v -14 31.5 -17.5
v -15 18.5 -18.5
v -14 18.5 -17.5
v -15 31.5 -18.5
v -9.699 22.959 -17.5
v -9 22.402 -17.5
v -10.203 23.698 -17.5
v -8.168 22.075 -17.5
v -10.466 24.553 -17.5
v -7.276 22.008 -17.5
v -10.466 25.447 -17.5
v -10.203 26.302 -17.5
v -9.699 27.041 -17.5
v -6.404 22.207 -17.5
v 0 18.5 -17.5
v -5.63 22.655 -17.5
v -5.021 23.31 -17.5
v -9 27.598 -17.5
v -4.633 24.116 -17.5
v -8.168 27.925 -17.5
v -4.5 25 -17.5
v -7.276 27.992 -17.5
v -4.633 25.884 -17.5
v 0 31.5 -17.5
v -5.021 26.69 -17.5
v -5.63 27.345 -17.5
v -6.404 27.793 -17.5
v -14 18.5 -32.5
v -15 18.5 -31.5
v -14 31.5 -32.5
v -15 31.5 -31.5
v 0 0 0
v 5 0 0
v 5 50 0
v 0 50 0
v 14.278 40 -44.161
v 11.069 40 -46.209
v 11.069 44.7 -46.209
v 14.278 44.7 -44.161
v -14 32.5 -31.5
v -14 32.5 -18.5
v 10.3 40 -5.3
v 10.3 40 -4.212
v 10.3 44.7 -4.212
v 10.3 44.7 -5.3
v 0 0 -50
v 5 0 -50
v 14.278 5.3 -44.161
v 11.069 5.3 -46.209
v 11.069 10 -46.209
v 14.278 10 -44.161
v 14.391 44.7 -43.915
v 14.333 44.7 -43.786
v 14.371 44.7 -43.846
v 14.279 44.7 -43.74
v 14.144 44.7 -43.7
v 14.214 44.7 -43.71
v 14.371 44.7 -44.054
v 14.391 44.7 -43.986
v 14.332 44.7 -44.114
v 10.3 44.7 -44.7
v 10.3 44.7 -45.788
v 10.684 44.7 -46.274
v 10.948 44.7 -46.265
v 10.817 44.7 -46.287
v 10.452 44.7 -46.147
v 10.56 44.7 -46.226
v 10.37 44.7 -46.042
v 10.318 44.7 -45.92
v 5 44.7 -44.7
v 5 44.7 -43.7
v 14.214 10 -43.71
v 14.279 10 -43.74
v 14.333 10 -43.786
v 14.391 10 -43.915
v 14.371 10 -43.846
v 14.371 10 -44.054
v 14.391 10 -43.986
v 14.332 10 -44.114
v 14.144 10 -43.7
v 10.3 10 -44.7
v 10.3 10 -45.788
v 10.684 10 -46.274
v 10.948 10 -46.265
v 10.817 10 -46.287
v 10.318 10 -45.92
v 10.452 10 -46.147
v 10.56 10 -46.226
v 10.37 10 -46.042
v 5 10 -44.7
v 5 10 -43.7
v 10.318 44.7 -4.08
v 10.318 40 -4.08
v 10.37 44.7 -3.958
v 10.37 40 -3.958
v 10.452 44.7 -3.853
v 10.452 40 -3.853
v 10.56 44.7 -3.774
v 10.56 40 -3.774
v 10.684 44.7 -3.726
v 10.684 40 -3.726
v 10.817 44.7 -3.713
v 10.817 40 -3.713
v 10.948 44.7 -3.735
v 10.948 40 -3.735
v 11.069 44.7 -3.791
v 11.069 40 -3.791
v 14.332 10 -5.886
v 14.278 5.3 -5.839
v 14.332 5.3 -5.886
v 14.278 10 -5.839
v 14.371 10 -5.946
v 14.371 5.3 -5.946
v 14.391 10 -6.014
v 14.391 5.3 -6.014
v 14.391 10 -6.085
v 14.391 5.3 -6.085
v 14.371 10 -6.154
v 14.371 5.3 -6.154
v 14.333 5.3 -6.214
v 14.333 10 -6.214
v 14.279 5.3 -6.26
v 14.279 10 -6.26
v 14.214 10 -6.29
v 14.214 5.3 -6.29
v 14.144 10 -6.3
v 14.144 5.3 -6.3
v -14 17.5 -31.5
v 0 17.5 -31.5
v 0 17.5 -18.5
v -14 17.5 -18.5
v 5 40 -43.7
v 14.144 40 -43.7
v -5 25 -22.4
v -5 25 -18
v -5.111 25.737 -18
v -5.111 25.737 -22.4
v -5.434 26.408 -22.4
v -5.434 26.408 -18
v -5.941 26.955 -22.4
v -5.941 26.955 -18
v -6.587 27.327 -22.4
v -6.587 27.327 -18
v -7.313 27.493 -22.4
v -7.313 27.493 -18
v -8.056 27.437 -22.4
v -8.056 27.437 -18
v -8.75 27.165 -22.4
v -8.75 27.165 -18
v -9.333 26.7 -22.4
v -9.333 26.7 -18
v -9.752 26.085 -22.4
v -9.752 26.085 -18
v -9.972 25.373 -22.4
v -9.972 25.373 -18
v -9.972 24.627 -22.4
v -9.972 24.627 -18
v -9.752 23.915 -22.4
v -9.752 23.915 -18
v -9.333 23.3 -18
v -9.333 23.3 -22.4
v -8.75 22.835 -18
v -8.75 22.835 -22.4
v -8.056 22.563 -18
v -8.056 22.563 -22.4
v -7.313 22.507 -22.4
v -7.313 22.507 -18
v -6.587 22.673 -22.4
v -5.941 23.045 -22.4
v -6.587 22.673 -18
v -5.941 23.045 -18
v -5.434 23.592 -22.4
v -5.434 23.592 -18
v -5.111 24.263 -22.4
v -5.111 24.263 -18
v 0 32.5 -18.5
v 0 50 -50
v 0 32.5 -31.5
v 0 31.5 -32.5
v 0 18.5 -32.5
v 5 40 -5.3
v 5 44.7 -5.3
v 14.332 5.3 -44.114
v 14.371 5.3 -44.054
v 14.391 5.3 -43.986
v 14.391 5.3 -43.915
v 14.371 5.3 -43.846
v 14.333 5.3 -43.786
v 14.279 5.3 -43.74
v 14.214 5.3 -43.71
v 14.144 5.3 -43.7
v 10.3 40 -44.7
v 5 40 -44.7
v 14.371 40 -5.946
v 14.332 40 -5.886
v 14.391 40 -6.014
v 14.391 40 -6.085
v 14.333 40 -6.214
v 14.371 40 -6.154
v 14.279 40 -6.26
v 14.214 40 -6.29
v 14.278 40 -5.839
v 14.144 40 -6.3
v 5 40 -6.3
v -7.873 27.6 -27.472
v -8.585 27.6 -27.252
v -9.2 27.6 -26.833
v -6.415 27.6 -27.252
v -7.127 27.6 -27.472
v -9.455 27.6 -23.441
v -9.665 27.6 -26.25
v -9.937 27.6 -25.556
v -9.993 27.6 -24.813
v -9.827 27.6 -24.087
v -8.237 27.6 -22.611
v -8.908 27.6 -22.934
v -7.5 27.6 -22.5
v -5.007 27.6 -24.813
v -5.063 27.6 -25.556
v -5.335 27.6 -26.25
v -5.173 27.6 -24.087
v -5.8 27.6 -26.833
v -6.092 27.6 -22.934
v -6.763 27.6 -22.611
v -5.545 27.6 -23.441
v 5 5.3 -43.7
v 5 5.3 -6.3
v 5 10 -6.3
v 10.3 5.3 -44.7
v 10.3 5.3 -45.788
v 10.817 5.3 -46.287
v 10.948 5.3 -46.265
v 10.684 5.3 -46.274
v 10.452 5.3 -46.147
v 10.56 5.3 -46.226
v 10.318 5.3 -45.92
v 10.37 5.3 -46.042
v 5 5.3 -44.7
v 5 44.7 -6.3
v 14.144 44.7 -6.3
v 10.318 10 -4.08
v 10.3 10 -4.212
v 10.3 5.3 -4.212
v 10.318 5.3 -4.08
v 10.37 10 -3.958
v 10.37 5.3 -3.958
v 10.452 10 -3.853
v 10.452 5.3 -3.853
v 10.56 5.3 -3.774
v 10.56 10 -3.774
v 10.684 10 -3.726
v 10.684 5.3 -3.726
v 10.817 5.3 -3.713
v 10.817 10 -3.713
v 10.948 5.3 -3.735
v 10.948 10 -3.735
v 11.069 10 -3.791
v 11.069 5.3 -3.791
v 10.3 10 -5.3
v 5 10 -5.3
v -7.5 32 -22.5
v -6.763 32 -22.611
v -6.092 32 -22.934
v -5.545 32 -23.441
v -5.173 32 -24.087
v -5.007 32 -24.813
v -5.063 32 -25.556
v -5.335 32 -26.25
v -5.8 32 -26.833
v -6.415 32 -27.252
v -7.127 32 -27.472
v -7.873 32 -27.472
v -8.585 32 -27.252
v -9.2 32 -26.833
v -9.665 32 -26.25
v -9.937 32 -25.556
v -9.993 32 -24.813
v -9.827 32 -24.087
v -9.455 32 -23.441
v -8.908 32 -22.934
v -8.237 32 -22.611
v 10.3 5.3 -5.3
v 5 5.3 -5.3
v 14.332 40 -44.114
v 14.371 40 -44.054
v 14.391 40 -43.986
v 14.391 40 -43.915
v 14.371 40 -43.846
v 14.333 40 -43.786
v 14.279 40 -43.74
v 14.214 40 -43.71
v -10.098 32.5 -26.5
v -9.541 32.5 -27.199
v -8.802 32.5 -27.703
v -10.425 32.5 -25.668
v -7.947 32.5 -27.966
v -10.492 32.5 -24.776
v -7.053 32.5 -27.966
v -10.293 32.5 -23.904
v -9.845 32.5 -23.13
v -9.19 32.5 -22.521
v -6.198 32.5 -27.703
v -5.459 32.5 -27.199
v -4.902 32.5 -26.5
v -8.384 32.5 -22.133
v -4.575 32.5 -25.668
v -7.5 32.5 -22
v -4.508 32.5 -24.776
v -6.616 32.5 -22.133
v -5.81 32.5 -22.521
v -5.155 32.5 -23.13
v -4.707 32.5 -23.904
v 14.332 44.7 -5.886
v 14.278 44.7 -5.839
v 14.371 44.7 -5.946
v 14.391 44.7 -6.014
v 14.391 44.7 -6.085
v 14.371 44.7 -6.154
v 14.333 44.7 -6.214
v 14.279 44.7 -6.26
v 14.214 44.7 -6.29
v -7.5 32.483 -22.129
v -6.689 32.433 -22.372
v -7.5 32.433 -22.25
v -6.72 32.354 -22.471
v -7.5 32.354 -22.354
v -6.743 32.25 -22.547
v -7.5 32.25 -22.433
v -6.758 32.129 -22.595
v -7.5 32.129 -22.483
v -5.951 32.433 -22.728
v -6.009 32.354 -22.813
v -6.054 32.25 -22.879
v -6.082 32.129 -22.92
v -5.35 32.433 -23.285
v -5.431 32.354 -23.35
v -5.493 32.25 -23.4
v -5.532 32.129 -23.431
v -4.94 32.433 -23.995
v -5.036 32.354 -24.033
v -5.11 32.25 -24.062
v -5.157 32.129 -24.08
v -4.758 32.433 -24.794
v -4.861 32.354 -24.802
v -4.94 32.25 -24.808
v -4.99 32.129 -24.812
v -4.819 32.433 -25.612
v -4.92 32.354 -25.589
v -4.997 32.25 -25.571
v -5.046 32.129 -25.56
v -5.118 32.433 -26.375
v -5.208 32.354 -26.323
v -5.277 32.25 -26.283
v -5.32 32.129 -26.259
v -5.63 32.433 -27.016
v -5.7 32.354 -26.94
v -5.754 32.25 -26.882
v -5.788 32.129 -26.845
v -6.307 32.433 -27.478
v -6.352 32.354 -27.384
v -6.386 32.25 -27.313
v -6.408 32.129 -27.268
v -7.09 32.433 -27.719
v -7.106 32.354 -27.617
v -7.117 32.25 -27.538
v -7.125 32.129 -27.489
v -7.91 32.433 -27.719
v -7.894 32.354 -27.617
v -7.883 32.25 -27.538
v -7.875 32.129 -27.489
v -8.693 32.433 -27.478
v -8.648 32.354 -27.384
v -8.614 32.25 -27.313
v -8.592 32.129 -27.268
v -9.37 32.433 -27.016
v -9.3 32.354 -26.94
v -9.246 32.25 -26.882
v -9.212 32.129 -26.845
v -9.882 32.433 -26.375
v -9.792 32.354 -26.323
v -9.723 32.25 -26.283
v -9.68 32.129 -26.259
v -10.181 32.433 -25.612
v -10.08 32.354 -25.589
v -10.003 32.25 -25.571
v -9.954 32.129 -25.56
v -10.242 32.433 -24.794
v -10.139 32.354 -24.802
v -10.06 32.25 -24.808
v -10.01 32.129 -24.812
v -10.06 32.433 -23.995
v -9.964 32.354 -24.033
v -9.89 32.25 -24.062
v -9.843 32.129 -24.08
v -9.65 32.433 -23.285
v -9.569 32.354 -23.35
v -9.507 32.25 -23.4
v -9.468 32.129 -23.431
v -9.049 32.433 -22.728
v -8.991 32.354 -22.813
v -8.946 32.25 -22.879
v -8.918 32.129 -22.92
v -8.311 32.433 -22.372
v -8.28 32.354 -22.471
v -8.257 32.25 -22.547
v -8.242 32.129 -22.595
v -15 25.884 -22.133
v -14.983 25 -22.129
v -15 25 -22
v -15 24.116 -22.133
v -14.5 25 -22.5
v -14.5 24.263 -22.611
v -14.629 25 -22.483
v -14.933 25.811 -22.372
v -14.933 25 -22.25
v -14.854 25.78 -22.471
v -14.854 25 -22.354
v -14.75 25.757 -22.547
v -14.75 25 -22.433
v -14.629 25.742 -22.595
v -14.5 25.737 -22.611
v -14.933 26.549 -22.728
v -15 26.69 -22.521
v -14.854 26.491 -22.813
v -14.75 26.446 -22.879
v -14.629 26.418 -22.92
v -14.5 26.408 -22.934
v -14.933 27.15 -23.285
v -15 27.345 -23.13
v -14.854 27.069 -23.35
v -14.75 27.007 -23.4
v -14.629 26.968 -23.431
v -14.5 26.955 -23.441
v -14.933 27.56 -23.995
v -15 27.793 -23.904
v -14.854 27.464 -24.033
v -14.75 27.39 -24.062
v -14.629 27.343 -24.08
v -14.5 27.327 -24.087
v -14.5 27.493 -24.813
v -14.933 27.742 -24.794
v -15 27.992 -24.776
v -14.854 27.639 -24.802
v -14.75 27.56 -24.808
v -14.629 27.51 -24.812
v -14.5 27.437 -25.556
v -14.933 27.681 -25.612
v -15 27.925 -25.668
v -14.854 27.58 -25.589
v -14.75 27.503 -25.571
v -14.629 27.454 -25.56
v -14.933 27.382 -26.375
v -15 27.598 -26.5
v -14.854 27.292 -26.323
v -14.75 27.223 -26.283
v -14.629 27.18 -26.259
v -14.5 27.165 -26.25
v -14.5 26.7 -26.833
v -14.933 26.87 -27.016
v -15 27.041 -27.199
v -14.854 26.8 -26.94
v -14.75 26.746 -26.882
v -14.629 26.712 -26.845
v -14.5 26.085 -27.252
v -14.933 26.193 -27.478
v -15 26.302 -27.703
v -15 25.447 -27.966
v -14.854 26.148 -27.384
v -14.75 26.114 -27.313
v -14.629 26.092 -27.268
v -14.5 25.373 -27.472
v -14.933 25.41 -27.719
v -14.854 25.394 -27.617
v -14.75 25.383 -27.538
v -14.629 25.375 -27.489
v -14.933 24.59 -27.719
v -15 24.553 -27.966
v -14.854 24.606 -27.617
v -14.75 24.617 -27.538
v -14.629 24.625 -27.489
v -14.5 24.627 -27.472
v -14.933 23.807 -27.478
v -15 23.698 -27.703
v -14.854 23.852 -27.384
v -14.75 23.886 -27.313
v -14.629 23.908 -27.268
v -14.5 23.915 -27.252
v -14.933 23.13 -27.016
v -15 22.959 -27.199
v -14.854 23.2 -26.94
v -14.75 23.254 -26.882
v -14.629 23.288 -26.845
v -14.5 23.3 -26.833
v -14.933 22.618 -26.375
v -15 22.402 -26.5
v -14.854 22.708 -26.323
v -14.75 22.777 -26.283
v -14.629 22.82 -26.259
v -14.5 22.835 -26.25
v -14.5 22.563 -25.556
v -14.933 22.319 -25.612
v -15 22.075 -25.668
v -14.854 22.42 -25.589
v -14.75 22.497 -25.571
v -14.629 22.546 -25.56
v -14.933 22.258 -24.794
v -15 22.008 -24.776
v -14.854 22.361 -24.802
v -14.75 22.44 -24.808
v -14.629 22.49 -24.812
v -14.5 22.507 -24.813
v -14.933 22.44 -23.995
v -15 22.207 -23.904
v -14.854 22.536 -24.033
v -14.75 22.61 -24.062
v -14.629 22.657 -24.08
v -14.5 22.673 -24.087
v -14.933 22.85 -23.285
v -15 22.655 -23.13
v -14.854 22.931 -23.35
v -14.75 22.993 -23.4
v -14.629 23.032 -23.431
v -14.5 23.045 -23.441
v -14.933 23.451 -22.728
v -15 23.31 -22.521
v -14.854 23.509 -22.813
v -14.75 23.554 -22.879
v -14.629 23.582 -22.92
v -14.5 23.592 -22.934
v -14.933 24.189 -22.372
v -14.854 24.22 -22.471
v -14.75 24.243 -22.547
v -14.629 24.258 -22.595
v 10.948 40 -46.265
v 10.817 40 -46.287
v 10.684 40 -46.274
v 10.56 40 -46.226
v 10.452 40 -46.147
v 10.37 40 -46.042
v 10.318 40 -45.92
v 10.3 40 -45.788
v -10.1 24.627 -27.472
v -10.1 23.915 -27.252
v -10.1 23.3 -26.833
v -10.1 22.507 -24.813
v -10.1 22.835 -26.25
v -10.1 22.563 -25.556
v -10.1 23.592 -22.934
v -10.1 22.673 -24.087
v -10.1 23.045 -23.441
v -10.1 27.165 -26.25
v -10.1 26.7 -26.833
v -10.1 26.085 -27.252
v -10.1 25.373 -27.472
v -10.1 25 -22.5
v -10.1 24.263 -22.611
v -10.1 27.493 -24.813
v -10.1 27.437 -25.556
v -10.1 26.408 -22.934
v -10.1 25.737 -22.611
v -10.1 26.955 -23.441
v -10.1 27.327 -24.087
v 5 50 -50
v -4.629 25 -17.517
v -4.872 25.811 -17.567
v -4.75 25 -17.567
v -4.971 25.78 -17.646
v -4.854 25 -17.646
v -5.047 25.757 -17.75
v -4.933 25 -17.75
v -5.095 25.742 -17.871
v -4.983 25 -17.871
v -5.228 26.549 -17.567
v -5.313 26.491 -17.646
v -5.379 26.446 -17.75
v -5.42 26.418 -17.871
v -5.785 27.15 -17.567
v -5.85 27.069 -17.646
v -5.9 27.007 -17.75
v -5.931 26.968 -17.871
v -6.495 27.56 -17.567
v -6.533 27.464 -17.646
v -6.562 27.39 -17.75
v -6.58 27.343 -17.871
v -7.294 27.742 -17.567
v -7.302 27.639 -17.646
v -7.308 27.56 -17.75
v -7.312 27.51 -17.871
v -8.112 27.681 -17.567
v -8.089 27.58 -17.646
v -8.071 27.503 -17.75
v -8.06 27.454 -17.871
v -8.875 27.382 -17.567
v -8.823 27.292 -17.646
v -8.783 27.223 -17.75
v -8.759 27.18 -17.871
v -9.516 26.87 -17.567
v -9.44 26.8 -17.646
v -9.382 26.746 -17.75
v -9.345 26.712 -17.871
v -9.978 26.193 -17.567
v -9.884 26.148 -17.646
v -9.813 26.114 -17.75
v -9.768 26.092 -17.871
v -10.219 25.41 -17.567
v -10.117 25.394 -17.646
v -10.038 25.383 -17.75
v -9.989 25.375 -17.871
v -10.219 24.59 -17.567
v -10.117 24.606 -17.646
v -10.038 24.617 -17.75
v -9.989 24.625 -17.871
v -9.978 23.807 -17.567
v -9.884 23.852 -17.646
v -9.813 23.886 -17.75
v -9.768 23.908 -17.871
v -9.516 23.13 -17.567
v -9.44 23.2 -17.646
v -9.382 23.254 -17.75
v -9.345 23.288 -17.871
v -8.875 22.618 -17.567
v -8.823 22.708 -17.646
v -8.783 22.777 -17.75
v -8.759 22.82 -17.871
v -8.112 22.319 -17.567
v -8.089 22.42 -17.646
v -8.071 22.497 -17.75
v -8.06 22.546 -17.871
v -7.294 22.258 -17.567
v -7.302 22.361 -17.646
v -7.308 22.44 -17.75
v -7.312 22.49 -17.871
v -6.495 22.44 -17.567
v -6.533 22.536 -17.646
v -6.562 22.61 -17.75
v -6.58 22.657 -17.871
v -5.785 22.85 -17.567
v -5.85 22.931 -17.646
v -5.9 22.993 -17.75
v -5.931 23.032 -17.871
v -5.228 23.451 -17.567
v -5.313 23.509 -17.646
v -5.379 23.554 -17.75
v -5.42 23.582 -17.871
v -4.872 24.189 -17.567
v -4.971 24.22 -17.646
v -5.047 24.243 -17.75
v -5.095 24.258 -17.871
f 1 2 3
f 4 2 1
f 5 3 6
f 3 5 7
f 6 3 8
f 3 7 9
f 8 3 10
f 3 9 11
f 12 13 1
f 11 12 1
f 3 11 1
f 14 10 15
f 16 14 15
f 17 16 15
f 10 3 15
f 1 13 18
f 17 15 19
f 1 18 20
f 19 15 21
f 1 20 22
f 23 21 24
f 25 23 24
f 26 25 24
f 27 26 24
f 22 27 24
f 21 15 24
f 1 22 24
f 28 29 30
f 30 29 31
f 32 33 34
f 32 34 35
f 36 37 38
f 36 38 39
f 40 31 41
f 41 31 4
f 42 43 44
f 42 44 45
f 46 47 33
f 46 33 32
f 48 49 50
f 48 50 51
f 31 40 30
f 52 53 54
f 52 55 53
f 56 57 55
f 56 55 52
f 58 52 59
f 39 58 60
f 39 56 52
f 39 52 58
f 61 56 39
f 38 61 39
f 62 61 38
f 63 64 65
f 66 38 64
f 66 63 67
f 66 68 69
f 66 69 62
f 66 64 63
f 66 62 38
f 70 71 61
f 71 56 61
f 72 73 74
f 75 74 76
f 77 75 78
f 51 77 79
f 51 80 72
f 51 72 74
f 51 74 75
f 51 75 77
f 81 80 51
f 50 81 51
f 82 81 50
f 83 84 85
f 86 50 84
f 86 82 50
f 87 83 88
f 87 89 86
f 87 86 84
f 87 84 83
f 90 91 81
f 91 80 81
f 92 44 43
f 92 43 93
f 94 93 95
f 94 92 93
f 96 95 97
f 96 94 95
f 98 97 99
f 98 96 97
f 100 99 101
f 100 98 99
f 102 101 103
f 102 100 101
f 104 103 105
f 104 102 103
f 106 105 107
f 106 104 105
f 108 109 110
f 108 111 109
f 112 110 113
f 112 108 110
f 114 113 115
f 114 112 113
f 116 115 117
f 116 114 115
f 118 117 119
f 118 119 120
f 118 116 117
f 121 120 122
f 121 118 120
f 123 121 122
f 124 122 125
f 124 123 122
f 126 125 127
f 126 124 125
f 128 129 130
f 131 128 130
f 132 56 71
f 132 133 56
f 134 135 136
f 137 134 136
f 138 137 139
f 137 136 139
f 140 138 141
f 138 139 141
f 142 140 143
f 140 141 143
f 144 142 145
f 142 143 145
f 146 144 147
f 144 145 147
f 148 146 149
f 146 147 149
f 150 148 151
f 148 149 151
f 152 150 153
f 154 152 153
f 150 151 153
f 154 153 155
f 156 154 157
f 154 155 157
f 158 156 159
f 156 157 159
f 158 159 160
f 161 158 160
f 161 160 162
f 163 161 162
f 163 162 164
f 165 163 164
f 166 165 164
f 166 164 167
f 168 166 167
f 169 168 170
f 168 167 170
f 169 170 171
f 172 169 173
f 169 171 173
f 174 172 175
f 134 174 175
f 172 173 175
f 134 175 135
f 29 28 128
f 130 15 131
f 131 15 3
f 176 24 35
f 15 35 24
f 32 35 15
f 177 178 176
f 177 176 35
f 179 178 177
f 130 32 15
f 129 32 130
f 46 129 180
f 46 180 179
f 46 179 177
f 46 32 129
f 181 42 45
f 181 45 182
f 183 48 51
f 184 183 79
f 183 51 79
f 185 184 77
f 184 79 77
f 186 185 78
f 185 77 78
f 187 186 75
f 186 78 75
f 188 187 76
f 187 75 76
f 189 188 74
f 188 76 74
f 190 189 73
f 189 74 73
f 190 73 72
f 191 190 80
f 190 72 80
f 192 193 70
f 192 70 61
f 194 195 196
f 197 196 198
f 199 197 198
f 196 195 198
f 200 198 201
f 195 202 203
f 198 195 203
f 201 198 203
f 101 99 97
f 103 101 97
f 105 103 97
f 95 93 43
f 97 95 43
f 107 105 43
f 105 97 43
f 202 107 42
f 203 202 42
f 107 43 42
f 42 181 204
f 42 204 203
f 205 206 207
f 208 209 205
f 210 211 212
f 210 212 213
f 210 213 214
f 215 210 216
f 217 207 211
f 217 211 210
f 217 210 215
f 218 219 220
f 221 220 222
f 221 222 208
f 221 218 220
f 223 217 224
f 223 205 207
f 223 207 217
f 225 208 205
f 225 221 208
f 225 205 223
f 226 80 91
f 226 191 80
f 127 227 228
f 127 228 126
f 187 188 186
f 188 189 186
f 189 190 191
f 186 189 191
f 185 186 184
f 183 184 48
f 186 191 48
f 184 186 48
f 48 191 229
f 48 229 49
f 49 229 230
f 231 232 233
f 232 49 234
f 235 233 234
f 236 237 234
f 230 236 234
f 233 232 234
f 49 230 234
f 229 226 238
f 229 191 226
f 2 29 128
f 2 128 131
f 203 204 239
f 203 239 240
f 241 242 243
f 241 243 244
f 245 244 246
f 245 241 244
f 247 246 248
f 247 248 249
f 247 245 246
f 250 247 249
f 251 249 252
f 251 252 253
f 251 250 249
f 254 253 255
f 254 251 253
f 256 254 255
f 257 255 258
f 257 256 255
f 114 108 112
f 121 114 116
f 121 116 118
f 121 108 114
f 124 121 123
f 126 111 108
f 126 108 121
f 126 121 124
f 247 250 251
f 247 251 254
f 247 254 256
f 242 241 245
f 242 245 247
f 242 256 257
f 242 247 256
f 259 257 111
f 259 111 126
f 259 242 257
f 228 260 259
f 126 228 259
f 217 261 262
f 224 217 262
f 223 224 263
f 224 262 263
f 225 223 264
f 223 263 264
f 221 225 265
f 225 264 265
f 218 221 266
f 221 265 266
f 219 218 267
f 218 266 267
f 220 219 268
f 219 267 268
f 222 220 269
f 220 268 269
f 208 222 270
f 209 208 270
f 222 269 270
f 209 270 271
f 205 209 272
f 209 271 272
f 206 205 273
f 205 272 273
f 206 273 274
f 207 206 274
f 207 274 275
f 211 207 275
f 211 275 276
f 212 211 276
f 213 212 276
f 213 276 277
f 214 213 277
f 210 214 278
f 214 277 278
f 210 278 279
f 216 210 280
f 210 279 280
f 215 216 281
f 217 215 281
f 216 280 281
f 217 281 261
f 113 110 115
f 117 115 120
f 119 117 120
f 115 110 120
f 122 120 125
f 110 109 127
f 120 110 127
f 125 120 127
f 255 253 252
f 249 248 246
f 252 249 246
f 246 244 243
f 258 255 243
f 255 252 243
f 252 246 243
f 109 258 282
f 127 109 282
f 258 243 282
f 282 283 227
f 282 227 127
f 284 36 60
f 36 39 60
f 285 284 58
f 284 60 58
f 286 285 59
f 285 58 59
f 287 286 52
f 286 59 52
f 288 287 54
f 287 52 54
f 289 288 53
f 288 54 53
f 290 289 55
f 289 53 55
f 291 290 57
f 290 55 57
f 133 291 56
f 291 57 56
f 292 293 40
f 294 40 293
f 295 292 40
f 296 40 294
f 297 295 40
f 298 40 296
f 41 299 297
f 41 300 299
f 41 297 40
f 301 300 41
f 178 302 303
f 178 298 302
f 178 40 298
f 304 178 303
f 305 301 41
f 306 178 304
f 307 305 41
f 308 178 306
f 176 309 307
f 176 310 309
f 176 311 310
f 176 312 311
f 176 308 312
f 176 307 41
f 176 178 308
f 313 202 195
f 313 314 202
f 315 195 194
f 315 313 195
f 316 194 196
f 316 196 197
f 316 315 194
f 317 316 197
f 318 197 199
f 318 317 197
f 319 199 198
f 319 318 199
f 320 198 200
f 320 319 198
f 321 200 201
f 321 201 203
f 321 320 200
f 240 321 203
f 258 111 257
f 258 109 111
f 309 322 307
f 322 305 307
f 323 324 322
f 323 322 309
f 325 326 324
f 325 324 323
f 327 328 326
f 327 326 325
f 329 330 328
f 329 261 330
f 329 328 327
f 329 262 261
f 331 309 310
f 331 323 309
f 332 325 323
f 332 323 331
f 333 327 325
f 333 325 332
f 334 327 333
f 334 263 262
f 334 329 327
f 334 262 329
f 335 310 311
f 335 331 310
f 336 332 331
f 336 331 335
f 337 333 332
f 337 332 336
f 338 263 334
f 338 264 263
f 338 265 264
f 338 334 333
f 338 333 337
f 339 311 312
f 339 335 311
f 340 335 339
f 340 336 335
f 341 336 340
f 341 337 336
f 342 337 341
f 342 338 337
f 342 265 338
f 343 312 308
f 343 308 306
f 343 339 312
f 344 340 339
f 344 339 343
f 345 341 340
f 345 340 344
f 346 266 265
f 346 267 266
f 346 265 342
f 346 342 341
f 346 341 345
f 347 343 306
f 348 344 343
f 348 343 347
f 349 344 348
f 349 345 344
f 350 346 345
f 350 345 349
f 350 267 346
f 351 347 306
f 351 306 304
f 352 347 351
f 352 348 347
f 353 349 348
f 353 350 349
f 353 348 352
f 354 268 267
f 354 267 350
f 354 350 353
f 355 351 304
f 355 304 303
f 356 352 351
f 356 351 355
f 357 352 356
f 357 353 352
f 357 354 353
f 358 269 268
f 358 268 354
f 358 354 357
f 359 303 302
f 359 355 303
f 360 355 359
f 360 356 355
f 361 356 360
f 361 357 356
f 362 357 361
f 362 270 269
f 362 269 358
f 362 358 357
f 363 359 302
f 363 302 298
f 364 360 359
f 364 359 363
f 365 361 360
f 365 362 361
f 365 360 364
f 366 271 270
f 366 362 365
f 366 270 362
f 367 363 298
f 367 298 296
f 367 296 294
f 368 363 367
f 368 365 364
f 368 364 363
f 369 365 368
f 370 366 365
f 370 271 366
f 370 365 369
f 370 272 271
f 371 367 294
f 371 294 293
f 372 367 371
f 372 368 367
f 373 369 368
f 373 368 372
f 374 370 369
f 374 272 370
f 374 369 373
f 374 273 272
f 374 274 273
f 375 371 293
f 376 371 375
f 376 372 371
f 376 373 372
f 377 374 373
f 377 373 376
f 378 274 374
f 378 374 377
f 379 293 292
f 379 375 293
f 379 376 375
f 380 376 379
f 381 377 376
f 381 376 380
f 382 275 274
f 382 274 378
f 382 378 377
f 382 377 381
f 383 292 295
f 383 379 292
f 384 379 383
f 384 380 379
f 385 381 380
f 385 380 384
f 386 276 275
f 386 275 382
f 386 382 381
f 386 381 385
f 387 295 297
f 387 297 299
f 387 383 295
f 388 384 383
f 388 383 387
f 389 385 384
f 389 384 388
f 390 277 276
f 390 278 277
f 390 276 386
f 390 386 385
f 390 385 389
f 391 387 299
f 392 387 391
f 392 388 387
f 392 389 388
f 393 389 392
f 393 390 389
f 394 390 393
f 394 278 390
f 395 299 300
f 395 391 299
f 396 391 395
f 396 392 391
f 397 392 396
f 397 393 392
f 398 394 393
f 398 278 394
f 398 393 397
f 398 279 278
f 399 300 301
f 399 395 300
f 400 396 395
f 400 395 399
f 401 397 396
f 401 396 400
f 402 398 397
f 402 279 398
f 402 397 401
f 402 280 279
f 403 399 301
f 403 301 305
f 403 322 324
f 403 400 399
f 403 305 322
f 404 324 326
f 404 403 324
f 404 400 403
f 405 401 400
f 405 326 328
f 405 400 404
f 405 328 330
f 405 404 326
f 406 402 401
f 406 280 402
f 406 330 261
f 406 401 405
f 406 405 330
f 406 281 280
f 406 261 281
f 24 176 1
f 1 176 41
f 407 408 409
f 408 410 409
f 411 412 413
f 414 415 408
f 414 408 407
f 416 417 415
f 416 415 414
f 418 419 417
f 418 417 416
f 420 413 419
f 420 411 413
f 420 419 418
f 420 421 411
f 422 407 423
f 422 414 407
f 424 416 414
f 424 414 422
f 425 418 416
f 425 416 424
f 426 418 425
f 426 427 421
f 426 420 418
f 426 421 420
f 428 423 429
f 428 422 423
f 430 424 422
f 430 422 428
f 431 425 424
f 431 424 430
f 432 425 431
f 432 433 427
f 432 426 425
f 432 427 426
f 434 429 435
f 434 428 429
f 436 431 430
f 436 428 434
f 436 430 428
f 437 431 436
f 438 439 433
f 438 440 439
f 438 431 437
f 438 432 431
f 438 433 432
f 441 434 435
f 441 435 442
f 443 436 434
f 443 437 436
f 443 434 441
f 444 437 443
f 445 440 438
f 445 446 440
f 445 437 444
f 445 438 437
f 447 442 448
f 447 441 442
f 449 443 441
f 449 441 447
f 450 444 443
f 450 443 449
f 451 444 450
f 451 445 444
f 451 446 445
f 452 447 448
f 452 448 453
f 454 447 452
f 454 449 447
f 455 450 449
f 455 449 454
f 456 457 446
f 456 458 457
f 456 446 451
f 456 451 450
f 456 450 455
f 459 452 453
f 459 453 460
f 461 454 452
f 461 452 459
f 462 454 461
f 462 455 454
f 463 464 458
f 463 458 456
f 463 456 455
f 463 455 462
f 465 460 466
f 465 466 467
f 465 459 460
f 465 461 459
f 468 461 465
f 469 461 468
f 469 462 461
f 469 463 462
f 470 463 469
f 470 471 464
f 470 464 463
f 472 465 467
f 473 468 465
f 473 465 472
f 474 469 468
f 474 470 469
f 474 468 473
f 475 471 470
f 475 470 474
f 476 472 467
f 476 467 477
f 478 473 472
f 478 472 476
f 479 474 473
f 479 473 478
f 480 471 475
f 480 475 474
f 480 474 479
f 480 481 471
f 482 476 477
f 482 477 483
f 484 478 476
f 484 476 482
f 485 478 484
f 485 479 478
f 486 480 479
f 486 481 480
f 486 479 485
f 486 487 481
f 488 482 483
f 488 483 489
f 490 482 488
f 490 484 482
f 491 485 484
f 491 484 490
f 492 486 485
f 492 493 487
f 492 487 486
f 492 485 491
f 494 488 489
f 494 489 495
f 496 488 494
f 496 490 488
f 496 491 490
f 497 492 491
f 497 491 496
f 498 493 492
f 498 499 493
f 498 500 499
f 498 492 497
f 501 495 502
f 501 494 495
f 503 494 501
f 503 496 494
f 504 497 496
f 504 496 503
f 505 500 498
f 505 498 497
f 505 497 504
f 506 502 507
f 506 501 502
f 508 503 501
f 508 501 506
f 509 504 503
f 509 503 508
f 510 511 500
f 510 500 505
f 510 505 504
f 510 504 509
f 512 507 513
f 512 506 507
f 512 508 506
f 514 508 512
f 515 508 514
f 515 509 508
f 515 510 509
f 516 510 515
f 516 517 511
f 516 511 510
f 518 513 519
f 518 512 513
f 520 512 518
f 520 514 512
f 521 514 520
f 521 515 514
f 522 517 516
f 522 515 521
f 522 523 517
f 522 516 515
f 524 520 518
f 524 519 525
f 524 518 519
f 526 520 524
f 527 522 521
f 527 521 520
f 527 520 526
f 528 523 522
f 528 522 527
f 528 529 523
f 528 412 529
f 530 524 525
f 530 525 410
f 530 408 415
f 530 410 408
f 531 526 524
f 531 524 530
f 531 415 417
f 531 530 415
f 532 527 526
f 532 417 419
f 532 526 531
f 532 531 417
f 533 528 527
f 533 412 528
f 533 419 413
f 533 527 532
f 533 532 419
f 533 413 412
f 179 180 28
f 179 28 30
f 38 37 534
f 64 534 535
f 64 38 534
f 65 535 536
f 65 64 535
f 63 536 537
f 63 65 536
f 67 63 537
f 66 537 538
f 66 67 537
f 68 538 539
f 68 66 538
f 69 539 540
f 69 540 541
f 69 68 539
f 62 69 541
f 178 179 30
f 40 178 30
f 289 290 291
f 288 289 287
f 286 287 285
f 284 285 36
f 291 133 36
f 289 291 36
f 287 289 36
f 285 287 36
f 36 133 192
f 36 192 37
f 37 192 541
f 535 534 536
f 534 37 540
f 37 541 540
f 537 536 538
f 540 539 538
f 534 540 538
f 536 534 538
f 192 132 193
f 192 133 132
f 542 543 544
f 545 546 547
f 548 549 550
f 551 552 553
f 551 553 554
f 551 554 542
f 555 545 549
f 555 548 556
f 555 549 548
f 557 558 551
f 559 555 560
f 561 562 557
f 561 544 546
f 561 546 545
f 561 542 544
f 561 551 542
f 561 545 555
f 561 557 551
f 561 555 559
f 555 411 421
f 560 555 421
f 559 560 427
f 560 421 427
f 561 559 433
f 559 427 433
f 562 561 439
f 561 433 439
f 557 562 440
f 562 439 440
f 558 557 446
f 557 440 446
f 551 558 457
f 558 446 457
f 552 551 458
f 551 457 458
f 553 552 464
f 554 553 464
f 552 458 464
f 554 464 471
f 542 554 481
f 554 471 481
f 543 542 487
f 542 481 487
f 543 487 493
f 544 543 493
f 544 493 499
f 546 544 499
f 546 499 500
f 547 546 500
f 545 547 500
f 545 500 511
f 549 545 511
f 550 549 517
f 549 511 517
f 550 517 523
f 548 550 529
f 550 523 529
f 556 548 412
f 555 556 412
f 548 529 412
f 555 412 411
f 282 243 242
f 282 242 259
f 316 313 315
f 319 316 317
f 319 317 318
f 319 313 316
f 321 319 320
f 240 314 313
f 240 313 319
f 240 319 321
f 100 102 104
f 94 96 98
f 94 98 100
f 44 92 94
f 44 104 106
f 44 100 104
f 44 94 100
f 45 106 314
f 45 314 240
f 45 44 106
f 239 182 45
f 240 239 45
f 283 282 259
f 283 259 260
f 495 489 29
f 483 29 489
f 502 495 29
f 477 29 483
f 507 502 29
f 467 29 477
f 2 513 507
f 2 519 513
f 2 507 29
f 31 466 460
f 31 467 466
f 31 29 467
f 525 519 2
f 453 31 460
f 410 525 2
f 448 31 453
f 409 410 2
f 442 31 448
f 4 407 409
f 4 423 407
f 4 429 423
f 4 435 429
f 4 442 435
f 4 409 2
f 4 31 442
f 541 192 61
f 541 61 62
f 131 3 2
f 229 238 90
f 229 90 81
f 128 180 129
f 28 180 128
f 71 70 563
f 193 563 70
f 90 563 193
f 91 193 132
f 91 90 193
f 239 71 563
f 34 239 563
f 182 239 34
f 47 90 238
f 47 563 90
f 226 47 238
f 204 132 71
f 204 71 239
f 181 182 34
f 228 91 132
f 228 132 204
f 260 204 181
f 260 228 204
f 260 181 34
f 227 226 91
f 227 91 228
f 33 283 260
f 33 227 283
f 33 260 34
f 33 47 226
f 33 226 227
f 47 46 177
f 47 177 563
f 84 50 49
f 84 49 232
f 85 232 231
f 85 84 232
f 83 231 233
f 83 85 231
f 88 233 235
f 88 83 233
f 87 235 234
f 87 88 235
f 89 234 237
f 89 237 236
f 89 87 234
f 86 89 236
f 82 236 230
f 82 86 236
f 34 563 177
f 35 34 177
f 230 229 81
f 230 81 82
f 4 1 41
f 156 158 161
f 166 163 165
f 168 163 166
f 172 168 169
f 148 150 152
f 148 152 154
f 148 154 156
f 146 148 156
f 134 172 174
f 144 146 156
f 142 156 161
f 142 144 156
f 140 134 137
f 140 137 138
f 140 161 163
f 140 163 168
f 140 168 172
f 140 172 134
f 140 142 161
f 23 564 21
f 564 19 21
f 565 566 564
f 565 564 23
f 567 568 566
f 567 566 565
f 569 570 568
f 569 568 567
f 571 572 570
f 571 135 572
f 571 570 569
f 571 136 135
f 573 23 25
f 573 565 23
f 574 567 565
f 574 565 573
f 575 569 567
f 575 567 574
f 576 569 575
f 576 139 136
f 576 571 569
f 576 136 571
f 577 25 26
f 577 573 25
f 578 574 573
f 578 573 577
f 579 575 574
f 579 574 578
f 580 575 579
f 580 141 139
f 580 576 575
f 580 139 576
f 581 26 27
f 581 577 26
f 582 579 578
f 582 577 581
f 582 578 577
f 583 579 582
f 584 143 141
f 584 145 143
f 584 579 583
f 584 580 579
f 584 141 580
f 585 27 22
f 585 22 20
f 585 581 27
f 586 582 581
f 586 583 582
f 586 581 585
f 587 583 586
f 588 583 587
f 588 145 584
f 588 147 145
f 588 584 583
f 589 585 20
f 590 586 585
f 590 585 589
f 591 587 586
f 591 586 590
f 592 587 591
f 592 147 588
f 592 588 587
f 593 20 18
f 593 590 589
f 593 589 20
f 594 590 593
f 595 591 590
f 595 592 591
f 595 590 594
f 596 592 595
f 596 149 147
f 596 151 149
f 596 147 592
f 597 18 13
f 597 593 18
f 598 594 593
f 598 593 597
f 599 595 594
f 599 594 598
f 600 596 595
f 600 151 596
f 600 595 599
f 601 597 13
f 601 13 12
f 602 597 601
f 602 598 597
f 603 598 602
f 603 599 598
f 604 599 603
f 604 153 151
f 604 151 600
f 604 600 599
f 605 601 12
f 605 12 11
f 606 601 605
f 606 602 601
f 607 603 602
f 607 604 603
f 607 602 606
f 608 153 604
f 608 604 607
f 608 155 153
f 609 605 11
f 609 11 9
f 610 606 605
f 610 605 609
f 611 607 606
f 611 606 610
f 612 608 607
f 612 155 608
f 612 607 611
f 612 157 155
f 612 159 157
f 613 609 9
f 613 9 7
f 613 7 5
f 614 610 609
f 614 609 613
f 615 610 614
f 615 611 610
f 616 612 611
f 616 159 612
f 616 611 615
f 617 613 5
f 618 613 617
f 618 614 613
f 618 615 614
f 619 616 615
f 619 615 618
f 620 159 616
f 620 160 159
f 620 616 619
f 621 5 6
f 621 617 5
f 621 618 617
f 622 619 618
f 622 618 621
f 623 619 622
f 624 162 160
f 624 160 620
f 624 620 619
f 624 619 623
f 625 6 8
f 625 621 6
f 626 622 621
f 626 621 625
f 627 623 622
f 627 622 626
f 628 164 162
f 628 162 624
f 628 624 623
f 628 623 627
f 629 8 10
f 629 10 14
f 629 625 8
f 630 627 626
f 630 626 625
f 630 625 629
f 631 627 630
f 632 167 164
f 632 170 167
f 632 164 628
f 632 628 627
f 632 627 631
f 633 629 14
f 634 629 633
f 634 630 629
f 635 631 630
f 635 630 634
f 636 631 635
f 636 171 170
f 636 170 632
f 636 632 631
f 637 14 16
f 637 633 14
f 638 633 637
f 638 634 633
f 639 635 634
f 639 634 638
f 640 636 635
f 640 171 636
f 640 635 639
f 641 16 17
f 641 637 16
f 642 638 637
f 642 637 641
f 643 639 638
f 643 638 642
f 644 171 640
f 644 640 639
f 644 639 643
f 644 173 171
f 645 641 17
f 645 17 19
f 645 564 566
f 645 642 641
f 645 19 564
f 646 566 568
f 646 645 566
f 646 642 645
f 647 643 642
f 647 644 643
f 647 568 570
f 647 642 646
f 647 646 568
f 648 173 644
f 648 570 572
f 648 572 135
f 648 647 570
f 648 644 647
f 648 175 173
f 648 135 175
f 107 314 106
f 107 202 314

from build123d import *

# Parameters (mm, degrees)
BOSS_EXTRUDE2_DEPTH = 50
SKETCH17_W          = 50
SKETCH17_H          = 5.3
CUT_EXTRUDE5_DEPTH  = 72.414284285
FILLET2_R           = 0.5
SKETCH18_W          = 15
SKETCH18_H          = 15
BOSS_EXTRUDE3_DEPTH = 15
SKETCH20_R          = 2.5
CUT_EXTRUDE6_DEPTH  = 4.9
SKETCH27_R          = 2.5
CUT_EXTRUDE11_DEPTH = 4.9
SKETCH30_R          = 2.5
CUT_EXTRUDE12_DEPTH = 4.9
CHAMFER1_SIZE       = 1
FILLET3_R           = 0.5
SKETCH31_W          = 50
SKETCH31_H          = 30
CUT_EXTRUDE13_DEPTH = 74.484692283
FILLET4_R           = 0.25


with BuildPart() as part:
    # Sketch3 → Boss-Extrude2 (new body)
    with BuildSketch(Plane(origin=(0, 0, 0), x_dir=(1, 0, 0), z_dir=(0, 1, 0))):
        Polygon((5, 44.7), (10.3, 44.7), (10.3, 46.7), (15, 43.7), (5, 43.7), (5, 6.3), (15, 6.3), (10.3, 3.3), (10.3, 5.3), (5, 5.3), (5, 0), (0, 0), (0, 50), (5, 50), align=None)
    extrude(amount=BOSS_EXTRUDE2_DEPTH)

    # Sketch17 → Cut-Extrude5 (cut, through all)
    with BuildSketch(Plane(origin=(5, 0, 0), x_dir=(0, 0, -1), z_dir=(1, 0, 0))):
        with Locations((25, 2.65)):
            Rectangle(SKETCH17_W, SKETCH17_H)
        with Locations((25, 47.35)):
            Rectangle(SKETCH17_W, SKETCH17_H)
    extrude(amount=CUT_EXTRUDE5_DEPTH, mode=Mode.SUBTRACT)

    # Fillet2
    fillet2_edges = [part.edges().sort_by_distance(p)[0] for p in [
        (10.3, 25, -46.7),
        (10.3, 25, -3.3),
    ]]
    fillet(fillet2_edges, radius=FILLET2_R)

    # Sketch18 → Boss-Extrude3 (add)
    with BuildSketch(Plane.ZY):
        with Locations((-25, 25)):
            Rectangle(SKETCH18_W, SKETCH18_H)
    extrude(amount=BOSS_EXTRUDE3_DEPTH)

    # Sketch20 → Cut-Extrude6 (cut)
    with BuildSketch(Plane(origin=(0, 32.5, 0), x_dir=(1, 0, 0), z_dir=(0, 1, 0))):
        with Locations((-7.5, 25)):
            Circle(SKETCH20_R)
    extrude(amount=-CUT_EXTRUDE6_DEPTH, mode=Mode.SUBTRACT)

    # Sketch27 → Cut-Extrude11 (cut)
    with BuildSketch(Plane.XY.offset(-17.5)):
        with Locations((-7.5, 25)):
            Circle(SKETCH27_R)
    extrude(amount=-CUT_EXTRUDE11_DEPTH, mode=Mode.SUBTRACT)

    # Sketch30 → Cut-Extrude12 (cut)
    with BuildSketch(Plane.ZY.offset(15)):
        with Locations((-25, 25)):
            Circle(SKETCH30_R)
    extrude(amount=-CUT_EXTRUDE12_DEPTH, mode=Mode.SUBTRACT)

    # Chamfer1
    chamfer1_edges = [part.edges().sort_by_distance(p)[0] for p in [
        (-7.5, 17.5, -17.5),
        (-15, 17.5, -25),
        (-7.5, 17.5, -32.5),
        (-7.5, 32.5, -32.5),
        (-15, 25, -32.5),
        (-15, 32.5, -25),
        (-15, 25, -17.5),
        (-7.5, 32.5, -17.5),
    ]]
    chamfer(chamfer1_edges, length=CHAMFER1_SIZE)

    # Fillet3
    fillet3_edges = [part.edges().sort_by_distance(p)[0] for p in [
        (-10, 32.5, -25),
        (-15, 25, -27.5),
        (-10, 25, -17.5),
    ]]
    fillet(fillet3_edges, radius=FILLET3_R)

    # Sketch31 → Cut-Extrude13 (cut, through all)
    with BuildSketch(Plane(origin=(5, 0, 0), x_dir=(0, 0, -1), z_dir=(1, 0, 0))):
        with Locations((25, 25)):
            Rectangle(SKETCH31_W, SKETCH31_H)
    extrude(amount=CUT_EXTRUDE13_DEPTH, mode=Mode.SUBTRACT)

    # Fillet4
    fillet4_edges = [part.edges().sort_by_distance(p)[0] for p in [
        (15, 42.35, -43.7),
        (15, 7.65, -43.7),
        (15, 7.65, -6.3),
        (15, 42.35, -6.3),
    ]]
    fillet(fillet4_edges, radius=FILLET4_R)


solid = part.part
